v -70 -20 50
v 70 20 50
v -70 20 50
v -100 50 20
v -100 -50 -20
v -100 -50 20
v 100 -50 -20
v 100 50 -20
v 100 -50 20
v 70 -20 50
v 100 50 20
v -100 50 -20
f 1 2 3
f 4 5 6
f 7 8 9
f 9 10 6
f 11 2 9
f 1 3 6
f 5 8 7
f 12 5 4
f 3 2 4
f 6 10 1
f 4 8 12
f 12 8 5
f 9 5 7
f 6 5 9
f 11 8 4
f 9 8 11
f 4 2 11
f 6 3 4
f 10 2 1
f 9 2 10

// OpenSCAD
color("orange")
hull(){
	cube([200,100,40], center=true);
	translate([0,0,25])
		cube([140,40,50], center=true);
}
